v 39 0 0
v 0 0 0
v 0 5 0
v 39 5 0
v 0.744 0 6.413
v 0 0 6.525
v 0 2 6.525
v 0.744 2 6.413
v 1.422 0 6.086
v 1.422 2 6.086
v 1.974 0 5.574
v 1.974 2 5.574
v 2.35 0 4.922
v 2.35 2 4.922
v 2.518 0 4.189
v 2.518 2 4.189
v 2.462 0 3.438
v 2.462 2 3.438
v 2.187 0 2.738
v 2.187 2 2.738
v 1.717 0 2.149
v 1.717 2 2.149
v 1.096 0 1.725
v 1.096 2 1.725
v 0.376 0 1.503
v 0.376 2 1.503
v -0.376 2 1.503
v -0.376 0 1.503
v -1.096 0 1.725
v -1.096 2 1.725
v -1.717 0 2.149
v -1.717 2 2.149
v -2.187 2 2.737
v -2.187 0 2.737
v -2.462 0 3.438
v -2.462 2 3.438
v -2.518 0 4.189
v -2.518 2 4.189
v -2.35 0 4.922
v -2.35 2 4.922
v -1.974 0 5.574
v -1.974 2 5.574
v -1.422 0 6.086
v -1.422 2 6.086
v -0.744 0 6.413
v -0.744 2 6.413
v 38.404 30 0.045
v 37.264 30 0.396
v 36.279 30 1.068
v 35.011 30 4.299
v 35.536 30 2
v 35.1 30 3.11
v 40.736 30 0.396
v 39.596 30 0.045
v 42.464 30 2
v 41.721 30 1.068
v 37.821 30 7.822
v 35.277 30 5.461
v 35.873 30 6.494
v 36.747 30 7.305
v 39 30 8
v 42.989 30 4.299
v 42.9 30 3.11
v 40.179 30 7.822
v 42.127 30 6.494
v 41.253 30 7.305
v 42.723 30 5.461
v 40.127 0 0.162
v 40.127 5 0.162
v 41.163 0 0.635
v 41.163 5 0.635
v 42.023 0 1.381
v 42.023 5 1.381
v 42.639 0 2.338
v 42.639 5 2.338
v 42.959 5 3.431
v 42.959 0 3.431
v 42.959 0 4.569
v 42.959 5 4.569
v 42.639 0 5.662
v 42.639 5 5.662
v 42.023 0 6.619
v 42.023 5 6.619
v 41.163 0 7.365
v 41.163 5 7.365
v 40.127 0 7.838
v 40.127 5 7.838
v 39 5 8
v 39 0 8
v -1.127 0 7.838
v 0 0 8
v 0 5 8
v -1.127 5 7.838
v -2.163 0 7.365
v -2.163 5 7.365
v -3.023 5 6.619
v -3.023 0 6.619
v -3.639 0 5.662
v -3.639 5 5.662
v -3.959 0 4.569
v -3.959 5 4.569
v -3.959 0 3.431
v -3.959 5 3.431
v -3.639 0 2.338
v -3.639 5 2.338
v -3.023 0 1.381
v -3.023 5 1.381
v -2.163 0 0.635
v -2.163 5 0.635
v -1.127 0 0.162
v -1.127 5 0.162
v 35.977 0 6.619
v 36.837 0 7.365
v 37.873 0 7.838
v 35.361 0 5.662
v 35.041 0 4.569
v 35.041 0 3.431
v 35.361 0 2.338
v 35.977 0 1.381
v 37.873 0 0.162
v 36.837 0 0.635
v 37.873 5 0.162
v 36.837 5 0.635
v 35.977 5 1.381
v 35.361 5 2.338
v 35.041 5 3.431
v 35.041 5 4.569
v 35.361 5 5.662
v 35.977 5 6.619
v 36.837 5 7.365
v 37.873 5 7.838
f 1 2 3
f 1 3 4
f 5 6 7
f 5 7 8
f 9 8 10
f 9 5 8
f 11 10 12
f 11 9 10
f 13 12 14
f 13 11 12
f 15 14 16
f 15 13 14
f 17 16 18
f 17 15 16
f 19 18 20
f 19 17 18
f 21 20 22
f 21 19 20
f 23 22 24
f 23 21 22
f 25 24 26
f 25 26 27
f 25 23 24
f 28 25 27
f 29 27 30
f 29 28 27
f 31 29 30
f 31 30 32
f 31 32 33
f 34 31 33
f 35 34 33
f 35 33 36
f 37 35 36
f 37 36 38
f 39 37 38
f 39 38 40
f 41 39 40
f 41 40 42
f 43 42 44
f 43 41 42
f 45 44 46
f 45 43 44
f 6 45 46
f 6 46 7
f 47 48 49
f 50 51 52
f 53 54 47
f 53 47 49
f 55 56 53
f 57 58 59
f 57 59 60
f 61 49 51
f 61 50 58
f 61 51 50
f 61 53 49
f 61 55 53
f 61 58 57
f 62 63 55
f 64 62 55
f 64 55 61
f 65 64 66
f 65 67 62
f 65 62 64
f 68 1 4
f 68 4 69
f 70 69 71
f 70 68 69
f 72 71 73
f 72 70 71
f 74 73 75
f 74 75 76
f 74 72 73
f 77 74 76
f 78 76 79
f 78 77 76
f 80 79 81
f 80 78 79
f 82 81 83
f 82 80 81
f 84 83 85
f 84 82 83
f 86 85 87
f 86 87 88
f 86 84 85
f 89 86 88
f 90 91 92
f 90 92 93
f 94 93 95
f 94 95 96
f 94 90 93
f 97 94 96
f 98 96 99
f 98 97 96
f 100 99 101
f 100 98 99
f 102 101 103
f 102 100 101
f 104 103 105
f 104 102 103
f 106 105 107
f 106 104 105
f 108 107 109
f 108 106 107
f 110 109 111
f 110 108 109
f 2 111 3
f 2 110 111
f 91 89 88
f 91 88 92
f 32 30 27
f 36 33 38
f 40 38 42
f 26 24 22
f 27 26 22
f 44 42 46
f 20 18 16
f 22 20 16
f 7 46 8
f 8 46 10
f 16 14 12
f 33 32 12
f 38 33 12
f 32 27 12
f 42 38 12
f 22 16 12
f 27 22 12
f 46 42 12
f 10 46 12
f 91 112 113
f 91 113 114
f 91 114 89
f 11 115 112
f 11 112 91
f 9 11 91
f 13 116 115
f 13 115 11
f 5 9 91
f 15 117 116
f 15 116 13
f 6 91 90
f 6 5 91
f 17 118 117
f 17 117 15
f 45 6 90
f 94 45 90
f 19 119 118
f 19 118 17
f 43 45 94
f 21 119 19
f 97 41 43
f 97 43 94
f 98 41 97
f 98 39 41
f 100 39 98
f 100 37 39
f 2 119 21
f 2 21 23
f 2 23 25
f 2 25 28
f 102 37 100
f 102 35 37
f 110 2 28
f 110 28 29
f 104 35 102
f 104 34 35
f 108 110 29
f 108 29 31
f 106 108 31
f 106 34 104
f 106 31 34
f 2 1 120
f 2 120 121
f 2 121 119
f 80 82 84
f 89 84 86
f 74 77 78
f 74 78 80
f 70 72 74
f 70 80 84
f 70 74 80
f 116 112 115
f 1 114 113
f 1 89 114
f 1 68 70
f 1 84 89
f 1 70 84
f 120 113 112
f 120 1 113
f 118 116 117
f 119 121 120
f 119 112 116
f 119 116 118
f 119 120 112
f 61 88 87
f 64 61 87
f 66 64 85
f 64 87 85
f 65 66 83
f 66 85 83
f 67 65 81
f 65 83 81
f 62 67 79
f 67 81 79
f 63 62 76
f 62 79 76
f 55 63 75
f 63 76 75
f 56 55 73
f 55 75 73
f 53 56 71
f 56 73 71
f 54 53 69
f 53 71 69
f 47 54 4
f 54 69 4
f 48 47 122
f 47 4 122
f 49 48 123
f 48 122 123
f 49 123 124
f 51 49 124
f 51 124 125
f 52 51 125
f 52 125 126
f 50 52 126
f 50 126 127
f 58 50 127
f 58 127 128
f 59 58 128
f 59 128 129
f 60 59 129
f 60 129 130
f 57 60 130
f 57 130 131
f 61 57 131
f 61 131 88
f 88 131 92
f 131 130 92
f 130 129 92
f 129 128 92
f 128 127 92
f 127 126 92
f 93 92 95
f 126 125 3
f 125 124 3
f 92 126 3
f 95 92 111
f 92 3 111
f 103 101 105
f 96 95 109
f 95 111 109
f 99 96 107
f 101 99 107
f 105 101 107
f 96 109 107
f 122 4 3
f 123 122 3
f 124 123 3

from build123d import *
from build123d.topology import SkipClean

# Parameters (mm, degrees)
BOSS_EXTRUDE1_DEPTH = 5
SKETCH2_R           = 2.525
CUT_EXTRUDE1_DEPTH  = 2
SKETCH3_R           = 4
BOSS_EXTRUDE2_DEPTH = 30


with BuildPart() as part:
    # Sketch1 → Boss-Extrude1 (new body)
    with BuildSketch(Plane(origin=(0, 0, 0), x_dir=(1, 0, 0), z_dir=(0, 1, 0))):
        with BuildLine():
            Line((0, 0), (39, 0))
            ThreePointArc((39, 0), (43.000000182, -3.999999909), (39.000000182, -8))
            Line((39.000000182, -8), (1.82e-07, -8))
            ThreePointArc((1.82e-07, -8), (-4, -4.000000091), (0, 0))
        make_face()
    extrude(amount=BOSS_EXTRUDE1_DEPTH)

    # Sketch2 → Cut-Extrude1 (cut)
    with BuildSketch(Plane(origin=(0, 0, 0), x_dir=(1, 0, 0), z_dir=(0, 1, 0))):
        with Locations(Location((0, -4, 0), (0, 0, 270))):
            Circle(SKETCH2_R)
    extrude(amount=CUT_EXTRUDE1_DEPTH, mode=Mode.SUBTRACT)

    # Sketch3 → Boss-Extrude2 (add)
    with SkipClean():  # the faces are left unmerged after this step: merging them gives an invalid solid
        with BuildSketch(Plane(origin=(0, 0, 0), x_dir=(1, 0, 0), z_dir=(0, 1, 0))):
            with Locations(Location((39.000000182, -4, 0), (0, 0, 270))):
                Circle(SKETCH3_R)
        extrude(amount=BOSS_EXTRUDE2_DEPTH)


solid = part.part
